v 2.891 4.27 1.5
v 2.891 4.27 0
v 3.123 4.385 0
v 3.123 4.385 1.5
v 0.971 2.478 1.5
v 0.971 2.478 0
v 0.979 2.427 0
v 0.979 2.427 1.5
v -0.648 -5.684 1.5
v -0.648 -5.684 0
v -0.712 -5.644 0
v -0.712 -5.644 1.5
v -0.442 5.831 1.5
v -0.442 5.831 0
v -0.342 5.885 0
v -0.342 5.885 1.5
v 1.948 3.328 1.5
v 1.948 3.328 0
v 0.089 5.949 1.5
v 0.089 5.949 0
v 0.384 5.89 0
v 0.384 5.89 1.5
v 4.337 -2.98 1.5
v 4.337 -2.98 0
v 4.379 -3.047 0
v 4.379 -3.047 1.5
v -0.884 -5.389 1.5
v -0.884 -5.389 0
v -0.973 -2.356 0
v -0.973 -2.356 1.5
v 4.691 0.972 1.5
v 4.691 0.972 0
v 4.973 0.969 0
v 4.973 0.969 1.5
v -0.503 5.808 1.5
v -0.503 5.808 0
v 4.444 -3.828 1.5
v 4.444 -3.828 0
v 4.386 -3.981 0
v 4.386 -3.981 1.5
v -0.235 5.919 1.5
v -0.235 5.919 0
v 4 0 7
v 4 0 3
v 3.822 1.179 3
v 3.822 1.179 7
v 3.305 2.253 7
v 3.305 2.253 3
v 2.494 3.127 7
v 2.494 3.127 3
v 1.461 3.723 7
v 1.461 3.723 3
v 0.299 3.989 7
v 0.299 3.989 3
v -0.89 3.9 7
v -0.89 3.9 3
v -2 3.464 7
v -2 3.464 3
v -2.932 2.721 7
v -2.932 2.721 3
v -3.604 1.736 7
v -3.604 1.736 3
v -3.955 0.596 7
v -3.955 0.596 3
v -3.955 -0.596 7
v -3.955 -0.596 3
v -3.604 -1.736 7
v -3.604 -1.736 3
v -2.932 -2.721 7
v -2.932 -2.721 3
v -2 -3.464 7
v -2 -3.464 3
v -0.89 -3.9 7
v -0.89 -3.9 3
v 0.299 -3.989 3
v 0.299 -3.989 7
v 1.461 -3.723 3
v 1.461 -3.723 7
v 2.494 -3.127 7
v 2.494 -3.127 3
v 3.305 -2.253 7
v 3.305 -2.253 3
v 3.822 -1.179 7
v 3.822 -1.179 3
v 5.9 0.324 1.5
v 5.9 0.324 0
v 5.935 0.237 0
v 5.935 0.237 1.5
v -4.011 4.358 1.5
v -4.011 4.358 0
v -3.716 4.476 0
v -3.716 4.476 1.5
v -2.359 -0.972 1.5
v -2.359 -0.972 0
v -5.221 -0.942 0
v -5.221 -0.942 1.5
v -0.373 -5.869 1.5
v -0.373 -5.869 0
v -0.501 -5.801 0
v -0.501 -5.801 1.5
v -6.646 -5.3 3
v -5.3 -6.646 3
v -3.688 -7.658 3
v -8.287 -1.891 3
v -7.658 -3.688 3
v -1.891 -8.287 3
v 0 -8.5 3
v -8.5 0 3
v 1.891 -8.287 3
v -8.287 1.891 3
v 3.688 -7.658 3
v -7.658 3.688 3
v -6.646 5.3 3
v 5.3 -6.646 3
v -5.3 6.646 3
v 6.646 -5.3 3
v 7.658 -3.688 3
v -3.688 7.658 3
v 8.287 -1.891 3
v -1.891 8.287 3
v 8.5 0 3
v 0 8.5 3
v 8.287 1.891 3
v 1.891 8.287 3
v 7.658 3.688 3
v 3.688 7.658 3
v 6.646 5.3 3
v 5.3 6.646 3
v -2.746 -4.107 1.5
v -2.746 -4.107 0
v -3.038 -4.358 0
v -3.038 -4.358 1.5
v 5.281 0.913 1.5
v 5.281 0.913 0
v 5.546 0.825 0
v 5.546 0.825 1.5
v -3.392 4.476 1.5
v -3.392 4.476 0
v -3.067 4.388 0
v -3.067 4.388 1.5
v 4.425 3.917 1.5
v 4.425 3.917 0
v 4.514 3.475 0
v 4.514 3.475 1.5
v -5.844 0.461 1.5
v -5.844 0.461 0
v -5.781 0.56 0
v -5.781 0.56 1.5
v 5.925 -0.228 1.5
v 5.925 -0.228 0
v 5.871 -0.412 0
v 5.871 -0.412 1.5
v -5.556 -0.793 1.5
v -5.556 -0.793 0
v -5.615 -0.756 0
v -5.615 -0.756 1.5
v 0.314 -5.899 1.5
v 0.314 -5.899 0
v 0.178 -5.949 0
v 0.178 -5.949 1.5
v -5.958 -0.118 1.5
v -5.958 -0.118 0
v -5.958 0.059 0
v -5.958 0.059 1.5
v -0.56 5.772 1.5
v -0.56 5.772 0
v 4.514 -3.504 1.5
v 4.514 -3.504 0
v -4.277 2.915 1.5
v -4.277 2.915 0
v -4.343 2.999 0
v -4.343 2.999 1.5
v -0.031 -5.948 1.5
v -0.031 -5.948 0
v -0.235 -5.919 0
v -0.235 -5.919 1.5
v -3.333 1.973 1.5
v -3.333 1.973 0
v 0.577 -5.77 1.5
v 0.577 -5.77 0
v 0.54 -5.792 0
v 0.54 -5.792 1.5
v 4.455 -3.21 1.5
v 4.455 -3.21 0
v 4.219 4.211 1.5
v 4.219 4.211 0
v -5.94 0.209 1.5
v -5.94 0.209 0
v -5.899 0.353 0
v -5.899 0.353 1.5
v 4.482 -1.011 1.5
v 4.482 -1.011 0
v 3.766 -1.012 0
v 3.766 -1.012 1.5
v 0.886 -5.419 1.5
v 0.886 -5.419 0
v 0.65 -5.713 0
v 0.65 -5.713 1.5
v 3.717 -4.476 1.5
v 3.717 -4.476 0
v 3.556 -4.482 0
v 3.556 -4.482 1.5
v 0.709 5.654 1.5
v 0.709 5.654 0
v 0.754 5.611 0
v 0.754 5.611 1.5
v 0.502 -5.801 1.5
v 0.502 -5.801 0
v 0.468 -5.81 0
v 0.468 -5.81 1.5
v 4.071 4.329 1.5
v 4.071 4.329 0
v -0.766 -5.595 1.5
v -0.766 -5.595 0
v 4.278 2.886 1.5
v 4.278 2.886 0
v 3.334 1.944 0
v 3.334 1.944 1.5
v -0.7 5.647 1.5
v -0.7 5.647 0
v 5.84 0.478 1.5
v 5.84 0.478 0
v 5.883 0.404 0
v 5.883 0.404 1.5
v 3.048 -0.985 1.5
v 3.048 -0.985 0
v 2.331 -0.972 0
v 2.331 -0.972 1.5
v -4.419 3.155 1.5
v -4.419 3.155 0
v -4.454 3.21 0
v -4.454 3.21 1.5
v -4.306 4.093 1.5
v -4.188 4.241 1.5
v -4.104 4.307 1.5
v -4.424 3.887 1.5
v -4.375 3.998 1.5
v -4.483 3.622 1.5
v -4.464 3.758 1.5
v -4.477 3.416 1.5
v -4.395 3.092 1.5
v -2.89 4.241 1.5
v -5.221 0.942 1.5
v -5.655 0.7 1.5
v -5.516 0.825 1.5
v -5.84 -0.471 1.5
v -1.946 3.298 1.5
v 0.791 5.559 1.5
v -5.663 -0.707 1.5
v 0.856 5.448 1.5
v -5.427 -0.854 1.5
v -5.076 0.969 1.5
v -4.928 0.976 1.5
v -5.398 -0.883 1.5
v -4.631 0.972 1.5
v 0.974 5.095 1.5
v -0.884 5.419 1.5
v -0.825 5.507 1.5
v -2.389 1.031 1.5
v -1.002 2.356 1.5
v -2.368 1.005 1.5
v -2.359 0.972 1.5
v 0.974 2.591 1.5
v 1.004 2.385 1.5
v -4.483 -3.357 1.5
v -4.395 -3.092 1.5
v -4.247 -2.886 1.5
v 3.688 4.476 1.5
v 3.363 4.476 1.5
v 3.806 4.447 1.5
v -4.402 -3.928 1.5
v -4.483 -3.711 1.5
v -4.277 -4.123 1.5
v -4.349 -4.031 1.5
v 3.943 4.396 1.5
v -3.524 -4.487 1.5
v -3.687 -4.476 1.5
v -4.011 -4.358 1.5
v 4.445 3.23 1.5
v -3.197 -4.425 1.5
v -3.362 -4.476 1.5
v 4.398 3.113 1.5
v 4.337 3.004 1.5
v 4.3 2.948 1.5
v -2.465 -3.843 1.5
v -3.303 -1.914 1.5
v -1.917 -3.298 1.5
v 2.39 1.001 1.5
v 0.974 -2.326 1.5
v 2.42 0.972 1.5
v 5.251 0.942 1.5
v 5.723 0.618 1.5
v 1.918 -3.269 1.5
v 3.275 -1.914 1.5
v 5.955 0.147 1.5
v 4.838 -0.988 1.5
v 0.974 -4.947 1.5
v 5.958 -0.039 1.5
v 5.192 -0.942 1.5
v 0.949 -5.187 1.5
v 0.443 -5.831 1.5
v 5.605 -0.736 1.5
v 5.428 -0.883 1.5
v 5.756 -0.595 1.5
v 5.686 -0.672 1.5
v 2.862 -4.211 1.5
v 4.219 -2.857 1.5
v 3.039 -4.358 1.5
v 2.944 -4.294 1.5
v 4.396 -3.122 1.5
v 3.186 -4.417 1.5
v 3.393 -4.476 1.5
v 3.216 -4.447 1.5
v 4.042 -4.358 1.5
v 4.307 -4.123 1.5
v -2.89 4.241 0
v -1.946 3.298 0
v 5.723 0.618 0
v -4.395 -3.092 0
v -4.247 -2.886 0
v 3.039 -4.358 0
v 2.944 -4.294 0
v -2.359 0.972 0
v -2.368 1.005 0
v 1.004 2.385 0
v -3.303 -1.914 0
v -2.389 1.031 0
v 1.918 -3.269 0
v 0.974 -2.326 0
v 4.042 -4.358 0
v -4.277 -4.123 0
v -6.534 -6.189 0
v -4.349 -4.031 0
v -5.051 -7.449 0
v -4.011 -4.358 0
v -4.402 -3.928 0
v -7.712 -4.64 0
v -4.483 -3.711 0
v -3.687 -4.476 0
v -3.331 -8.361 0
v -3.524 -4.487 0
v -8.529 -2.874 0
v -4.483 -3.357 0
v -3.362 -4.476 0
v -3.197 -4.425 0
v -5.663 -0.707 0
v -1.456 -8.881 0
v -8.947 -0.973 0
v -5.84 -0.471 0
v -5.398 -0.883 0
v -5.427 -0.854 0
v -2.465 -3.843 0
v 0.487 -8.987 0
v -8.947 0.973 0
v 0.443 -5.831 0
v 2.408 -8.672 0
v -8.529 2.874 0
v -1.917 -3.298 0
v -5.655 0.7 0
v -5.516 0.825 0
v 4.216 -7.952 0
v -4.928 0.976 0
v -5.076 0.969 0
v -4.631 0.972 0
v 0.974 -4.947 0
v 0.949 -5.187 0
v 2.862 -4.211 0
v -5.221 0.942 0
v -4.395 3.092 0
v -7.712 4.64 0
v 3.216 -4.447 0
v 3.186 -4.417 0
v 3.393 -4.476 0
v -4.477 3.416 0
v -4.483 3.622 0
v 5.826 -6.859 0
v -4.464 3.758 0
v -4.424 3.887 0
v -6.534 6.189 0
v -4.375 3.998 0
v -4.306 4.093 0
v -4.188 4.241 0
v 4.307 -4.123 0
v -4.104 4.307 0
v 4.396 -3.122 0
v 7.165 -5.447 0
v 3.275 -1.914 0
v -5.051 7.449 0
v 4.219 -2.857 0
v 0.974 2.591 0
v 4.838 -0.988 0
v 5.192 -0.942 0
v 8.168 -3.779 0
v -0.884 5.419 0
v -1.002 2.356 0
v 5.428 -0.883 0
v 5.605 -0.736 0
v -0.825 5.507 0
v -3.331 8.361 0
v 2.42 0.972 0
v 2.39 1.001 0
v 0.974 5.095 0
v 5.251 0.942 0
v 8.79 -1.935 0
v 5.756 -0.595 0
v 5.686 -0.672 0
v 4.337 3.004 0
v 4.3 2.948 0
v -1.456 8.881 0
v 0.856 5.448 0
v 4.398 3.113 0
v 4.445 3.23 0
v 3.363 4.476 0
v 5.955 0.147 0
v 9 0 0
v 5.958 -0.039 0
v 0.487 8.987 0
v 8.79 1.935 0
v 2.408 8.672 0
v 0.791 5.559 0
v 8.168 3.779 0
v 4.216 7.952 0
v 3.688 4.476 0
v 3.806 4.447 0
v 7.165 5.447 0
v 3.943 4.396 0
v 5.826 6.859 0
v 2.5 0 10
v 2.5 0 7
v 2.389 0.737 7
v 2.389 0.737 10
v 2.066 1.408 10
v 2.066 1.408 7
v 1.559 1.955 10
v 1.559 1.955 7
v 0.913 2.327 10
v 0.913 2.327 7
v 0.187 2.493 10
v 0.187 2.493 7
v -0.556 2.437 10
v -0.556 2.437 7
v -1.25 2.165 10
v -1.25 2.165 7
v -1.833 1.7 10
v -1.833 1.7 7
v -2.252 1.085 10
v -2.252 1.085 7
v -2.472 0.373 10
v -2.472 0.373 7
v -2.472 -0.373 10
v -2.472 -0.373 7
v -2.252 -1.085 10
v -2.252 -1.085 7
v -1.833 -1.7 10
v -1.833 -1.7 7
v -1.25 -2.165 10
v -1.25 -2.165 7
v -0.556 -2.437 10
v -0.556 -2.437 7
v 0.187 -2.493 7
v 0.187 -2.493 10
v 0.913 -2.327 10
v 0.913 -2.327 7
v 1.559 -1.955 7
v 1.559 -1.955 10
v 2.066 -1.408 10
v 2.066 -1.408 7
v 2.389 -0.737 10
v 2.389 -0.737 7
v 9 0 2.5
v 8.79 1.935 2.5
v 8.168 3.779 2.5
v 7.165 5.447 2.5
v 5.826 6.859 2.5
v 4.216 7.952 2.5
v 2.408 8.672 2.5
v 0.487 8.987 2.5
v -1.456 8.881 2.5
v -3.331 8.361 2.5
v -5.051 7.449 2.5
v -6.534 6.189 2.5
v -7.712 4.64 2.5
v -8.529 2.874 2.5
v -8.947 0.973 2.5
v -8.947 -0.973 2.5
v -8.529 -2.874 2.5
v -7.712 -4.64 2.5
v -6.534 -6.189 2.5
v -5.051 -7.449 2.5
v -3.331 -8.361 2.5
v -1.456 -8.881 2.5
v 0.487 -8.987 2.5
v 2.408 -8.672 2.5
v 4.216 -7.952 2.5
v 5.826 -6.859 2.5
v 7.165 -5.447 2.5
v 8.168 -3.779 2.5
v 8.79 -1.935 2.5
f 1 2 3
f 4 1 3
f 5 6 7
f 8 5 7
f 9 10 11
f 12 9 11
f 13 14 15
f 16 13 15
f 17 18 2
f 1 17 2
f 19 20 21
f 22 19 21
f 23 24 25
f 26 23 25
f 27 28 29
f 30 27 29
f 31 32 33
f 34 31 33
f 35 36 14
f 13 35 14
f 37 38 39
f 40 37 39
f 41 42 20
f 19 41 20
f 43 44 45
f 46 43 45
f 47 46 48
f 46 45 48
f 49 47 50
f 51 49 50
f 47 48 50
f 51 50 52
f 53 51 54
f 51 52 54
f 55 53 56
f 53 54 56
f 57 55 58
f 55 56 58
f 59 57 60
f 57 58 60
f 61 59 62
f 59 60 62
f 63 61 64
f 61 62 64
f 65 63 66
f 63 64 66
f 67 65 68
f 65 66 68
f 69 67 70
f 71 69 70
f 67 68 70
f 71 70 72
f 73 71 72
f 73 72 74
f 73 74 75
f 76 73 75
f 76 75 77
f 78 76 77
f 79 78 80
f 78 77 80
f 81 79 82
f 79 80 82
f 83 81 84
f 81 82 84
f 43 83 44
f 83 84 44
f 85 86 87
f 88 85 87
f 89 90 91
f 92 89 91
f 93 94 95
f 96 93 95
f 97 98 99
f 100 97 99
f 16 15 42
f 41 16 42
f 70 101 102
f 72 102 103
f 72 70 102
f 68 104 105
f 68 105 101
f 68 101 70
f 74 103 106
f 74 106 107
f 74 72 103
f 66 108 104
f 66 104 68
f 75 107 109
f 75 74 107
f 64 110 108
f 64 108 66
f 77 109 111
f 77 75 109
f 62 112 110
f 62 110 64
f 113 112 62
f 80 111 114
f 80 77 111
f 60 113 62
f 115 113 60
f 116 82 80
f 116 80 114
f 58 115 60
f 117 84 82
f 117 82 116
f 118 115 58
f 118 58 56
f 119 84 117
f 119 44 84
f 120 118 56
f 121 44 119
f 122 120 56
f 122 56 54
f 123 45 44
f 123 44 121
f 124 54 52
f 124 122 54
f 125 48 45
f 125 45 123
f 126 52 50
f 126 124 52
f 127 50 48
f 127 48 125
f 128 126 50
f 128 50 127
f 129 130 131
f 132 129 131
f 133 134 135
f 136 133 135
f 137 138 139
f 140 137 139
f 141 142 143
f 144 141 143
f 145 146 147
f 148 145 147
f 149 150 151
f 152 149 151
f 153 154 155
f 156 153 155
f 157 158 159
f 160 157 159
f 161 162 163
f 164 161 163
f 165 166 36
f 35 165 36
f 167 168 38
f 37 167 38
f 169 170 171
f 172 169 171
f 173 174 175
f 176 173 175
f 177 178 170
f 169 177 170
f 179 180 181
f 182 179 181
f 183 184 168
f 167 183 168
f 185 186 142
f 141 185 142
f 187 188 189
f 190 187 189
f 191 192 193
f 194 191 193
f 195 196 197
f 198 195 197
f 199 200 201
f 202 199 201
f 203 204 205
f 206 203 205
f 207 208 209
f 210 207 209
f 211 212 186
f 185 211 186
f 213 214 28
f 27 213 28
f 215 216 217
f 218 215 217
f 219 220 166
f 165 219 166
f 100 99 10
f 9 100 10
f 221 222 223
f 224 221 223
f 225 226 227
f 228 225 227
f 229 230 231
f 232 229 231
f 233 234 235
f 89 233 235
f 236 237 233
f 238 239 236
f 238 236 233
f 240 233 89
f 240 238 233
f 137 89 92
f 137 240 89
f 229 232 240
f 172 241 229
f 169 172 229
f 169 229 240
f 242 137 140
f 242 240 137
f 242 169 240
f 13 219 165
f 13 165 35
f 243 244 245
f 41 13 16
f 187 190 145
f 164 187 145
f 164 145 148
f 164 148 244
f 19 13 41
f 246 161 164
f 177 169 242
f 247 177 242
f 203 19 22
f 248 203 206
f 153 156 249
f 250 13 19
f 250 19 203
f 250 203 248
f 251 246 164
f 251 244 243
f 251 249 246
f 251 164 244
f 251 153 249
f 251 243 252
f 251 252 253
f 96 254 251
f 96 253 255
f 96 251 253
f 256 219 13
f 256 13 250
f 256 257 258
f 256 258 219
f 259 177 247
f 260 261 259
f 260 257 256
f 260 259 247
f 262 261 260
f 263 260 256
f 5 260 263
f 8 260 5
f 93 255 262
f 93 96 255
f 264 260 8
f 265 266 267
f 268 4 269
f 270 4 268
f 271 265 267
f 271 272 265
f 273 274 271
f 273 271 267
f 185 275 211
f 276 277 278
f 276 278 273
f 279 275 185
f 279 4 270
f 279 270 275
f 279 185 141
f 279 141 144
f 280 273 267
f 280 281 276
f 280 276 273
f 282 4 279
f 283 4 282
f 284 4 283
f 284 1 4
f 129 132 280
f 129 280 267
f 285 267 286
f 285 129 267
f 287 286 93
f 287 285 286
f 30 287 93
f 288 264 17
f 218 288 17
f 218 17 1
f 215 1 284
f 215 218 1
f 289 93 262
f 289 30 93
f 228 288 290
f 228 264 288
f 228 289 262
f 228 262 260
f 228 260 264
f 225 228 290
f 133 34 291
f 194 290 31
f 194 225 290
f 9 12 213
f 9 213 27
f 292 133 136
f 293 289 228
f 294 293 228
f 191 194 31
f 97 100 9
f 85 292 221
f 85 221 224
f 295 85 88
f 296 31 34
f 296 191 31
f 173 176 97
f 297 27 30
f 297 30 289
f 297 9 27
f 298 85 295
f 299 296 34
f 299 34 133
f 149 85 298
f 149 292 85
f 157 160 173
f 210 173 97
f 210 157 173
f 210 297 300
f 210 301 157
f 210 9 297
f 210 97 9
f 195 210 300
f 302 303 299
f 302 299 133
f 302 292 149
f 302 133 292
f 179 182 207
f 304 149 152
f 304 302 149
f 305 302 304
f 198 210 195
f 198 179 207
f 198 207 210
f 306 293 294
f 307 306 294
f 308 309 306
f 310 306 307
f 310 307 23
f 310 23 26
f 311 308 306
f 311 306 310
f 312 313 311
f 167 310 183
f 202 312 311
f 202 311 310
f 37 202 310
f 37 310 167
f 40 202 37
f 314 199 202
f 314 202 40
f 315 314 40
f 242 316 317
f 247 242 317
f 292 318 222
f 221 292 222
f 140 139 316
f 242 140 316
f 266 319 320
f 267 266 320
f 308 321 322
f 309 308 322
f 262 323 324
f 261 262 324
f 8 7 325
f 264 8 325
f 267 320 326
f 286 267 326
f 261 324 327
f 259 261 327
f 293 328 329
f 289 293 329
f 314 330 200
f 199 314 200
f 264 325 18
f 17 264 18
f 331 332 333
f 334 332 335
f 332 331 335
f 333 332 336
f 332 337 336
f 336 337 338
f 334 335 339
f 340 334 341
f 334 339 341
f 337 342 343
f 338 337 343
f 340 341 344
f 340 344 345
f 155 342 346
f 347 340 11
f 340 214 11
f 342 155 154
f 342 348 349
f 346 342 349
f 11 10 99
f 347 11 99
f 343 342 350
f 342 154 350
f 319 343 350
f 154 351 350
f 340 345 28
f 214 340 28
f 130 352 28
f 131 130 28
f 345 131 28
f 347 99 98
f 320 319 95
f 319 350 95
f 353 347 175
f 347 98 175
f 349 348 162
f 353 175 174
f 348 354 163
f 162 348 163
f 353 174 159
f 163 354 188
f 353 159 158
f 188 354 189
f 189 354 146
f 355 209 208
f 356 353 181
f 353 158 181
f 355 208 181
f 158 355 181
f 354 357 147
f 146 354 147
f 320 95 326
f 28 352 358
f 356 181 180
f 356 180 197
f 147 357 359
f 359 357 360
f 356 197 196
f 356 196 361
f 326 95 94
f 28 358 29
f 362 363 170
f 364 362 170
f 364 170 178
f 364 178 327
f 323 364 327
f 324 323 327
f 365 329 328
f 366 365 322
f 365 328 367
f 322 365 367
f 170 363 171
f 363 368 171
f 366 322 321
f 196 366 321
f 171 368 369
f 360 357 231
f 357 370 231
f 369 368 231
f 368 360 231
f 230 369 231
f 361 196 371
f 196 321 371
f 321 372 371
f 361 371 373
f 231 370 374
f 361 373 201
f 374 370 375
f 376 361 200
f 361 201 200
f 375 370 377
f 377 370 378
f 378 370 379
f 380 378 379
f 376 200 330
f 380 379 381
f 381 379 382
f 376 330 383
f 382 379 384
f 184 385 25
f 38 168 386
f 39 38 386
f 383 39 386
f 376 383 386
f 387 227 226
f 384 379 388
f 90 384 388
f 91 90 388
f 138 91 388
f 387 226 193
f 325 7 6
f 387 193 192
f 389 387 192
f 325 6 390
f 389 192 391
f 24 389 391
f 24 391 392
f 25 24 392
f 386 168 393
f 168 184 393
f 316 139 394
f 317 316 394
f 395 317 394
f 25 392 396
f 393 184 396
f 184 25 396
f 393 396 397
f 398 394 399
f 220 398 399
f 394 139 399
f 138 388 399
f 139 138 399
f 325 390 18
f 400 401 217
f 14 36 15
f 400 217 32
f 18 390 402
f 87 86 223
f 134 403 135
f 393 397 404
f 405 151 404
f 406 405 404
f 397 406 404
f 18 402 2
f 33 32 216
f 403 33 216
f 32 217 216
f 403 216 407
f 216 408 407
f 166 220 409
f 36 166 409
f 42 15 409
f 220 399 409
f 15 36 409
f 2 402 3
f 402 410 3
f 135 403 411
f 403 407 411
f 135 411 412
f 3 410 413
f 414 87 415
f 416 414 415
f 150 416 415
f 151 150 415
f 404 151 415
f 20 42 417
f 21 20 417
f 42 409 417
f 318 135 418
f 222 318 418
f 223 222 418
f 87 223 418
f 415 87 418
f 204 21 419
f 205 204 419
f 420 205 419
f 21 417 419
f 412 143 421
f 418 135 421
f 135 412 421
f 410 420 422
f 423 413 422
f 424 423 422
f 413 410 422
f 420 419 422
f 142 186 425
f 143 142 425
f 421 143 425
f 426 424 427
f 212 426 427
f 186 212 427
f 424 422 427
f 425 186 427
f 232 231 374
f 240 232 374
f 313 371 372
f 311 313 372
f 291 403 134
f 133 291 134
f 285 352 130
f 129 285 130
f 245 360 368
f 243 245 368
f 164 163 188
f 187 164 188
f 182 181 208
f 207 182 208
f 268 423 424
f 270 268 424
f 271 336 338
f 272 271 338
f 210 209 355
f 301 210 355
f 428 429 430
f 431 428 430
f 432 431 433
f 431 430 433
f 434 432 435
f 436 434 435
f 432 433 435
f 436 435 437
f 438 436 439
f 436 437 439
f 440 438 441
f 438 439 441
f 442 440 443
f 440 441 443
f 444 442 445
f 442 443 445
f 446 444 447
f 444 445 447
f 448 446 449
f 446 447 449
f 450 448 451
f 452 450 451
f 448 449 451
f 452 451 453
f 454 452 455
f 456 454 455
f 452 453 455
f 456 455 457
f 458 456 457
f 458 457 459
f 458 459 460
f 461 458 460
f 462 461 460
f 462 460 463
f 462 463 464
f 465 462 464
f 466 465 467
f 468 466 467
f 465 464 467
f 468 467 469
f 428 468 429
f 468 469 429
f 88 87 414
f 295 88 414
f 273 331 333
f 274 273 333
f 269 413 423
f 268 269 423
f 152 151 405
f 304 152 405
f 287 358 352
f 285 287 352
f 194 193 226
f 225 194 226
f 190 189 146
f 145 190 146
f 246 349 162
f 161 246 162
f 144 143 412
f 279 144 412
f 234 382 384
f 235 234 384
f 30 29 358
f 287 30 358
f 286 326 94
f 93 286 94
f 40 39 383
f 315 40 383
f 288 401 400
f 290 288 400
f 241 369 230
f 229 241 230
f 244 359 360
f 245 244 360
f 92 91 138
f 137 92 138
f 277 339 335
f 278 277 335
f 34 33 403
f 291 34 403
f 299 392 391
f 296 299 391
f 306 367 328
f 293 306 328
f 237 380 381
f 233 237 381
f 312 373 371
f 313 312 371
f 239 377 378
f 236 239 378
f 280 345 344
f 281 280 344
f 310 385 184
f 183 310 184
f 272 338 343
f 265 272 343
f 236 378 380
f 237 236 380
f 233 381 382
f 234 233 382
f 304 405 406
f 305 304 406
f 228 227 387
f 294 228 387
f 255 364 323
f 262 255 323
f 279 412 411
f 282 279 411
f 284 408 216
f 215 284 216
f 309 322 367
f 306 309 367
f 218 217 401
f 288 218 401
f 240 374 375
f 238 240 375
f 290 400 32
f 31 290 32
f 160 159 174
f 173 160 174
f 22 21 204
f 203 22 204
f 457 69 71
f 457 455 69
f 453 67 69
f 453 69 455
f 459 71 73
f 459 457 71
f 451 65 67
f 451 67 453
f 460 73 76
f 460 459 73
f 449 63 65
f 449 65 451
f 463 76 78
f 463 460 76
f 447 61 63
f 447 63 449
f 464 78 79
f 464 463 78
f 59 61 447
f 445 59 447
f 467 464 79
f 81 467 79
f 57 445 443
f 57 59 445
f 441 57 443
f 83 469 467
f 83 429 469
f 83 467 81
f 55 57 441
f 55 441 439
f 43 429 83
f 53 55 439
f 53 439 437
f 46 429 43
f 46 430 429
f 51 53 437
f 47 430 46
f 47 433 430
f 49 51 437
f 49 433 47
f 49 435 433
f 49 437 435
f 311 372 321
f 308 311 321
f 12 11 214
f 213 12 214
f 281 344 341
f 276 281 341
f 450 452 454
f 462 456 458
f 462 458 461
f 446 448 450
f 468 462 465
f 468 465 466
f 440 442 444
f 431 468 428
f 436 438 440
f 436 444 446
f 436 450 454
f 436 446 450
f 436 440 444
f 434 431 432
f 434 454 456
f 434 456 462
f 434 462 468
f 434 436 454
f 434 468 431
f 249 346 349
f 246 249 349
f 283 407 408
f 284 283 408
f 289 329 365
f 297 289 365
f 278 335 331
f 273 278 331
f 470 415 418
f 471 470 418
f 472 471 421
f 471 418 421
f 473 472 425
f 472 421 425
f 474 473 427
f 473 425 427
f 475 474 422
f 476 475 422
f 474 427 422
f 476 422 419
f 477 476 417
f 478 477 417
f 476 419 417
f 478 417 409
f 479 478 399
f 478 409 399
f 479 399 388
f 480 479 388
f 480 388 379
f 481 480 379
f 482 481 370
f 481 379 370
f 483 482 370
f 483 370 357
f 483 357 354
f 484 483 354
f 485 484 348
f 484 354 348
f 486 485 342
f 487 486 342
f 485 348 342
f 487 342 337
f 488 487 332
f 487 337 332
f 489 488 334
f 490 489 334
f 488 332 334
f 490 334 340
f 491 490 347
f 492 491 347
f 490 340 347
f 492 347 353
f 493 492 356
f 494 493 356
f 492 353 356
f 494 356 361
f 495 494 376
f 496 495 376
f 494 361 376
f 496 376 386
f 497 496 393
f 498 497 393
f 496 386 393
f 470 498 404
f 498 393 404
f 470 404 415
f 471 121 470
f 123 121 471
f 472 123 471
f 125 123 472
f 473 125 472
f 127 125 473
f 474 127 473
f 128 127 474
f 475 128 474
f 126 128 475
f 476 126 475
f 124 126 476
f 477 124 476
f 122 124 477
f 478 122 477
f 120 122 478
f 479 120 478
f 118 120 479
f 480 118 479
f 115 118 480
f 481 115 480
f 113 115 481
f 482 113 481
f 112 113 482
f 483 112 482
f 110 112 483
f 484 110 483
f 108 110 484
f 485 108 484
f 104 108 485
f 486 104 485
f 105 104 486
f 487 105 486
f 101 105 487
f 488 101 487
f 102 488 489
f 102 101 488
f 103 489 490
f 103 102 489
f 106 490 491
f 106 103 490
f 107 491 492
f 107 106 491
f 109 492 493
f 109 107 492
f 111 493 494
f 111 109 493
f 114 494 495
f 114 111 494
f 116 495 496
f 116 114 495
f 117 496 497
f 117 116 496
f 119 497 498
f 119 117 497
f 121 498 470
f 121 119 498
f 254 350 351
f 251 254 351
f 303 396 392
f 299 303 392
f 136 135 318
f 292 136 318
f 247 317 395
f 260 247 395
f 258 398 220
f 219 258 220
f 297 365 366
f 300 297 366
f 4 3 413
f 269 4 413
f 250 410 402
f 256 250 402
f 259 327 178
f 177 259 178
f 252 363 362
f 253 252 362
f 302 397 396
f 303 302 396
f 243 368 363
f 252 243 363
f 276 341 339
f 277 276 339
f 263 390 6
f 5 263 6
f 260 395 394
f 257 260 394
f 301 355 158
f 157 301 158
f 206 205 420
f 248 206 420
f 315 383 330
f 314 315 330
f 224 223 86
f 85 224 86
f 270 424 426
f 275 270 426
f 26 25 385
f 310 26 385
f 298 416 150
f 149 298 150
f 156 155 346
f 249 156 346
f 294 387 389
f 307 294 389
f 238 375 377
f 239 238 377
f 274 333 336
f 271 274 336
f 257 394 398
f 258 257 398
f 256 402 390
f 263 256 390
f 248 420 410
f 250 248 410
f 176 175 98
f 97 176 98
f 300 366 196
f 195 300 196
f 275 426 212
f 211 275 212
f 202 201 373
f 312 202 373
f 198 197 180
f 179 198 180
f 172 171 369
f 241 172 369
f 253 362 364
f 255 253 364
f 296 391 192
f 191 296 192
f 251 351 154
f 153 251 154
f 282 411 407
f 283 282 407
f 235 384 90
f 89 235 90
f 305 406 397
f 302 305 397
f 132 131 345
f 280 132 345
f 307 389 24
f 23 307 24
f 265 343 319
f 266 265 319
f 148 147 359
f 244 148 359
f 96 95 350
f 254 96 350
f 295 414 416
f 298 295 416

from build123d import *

# Parameters (mm, degrees)
F0_R     = 9
F1_DEPTH = 3
F2_SIZE  = 0.5
F3_R     = 4
F4_DEPTH = 4
F5_R     = 2.5
F6_DEPTH = 3
F8_DEPTH = 1.5


with BuildPart() as f1:
    # F0 (on Top) → F1 (new body)
    with BuildSketch(Plane.XY):
        Circle(F0_R)
    extrude(amount=F1_DEPTH)

    # F2
    f2_edges = [f1.edges().sort_by_distance(p)[0] for p in [
        (-9, 0, 3),
    ]]
    chamfer(f2_edges, length=F2_SIZE)

    # F3 (on face) → F4 (join)
    with BuildSketch(Plane.XY.offset(3)):
        Circle(F3_R)
    extrude(amount=F4_DEPTH)

    # F5 (on face) → F6 (join)
    with BuildSketch(Plane.XY.offset(7)):
        Circle(F5_R)
    extrude(amount=F6_DEPTH)

    # F7 (on face) → F8 (cut)
    with BuildSketch(Plane(origin=(0, 0, 0), x_dir=(1, 0, 0), z_dir=(0, 0, -1))):
        Polygon((-0.031379, 5.948377), (-0.235333, 5.919157), (-0.372759, 5.868757), (-0.500818, 5.801363), (-0.64831, 5.683569), (-0.711513, 5.643549), (-0.766303, 5.595223), (-0.884297, 5.389084), (-0.972792, 2.355883), (-1.91674, 3.298237), (-2.464657, 3.842872), (-2.74588, 4.106761), (-3.037677, 4.358384), (-3.197437, 4.424921), (-3.362159, 4.476179), (-3.5244, 4.487041), (-3.686641, 4.476179), (-4.011123, 4.358384), (-4.276609, 4.122796), (-4.349034, 4.030994), (-4.401972, 3.928468), (-4.483097, 3.710516), (-4.483097, 3.357134), (-4.394602, 3.092097), (-4.24711, 2.885957), (-3.303163, 1.914155), (-2.359215, 0.971802), (-5.220556, 0.942353), (-5.397547, 0.883456), (-5.427045, 0.854008), (-5.556038, 0.793243), (-5.614945, 0.756011), (-5.663032, 0.706765), (-5.840022, 0.471176), (-5.958016, 0.117794), (-5.958016, -0.058897), (-5.940408, -0.209293), (-5.899019, -0.353383), (-5.843566, -0.461413), (-5.781025, -0.559523), (-5.655249, -0.699811), (-5.51554, -0.82456), (-5.220556, -0.942354), (-5.075648, -0.968558), (-4.928112, -0.97628), (-4.630589, -0.971802), (-4.188114, -0.971802), (-2.359215, -0.971802), (-2.368134, -1.005446), (-2.388713, -1.030699), (-3.332661, -1.973053), (-4.276609, -2.915406), (-4.34313, -2.999393), (-4.394602, -3.092097), (-4.419005, -3.155066), (-4.453599, -3.209892), (-4.476923, -3.415726), (-4.483097, -3.622171), (-4.464349, -3.757662), (-4.424101, -3.887208), (-4.374765, -3.997645), (-4.306107, -4.093348), (-4.188114, -4.240591), (-4.103985, -4.307), (-4.011123, -4.358385), (-3.71614, -4.476179), (-3.391658, -4.476179), (-3.067176, -4.387833), (-2.890186, -4.240591), (-1.946238, -3.298237), (-1.00229, -2.355884), (-0.884297, -5.418533), (-0.8253, -5.506878), (-0.699524, -5.647167), (-0.559815, -5.771915), (-0.503448, -5.807594), (-0.441821, -5.830812), (-0.341941, -5.885287), (-0.235333, -5.919158), (0.089149, -5.948606), (0.384133, -5.889709), (0.708615, -5.654121), (0.754319, -5.61094), (0.790702, -5.558969), (0.856107, -5.447981), (0.9741, -5.094599), (0.9741, -4.417282), (0.9741, -2.591472), (0.971489, -2.477691), (0.979459, -2.426523), (1.003599, -2.385332), (1.947546, -3.327686), (2.891494, -4.270039), (3.122896, -4.385014), (3.363468, -4.476179), (3.68795, -4.476179), (3.805943, -4.446731), (3.94337, -4.39633), (4.071429, -4.328936), (4.218921, -4.211142), (4.425409, -3.916657), (4.513904, -3.474929), (4.444862, -3.229831), (4.398065, -3.113042), (4.336914, -3.003752), (4.300041, -2.947904), (4.277917, -2.885958), (3.33397, -1.943604), (2.390022, -1.001251), (2.41952, -0.971802), (2.861996, -0.971802), (4.690894, -0.971802), (4.972609, -0.968567), (5.251363, -0.942354), (5.280862, -0.912905), (5.546347, -0.82456), (5.723337, -0.61842), (5.839817, -0.478169), (5.883167, -0.404005), (5.900327, -0.323934), (5.934856, -0.237188), (5.954737, -0.147151), (5.958016, 0.039233), (5.925076, 0.228087), (5.870829, 0.412279), (5.7562, 0.594983), (5.685681, 0.672036), (5.605344, 0.736213), (5.428354, 0.883456), (5.192367, 0.942353), (4.838344, 0.987761), (4.482387, 1.011028), (3.766457, 1.011578), (3.048146, 0.984877), (2.331025, 0.971802), (3.274973, 1.914155), (4.218921, 2.856509), (4.337268, 2.979647), (4.379451, 3.047229), (4.395911, 3.121546), (4.454907, 3.209891), (4.513904, 3.504377), (4.444233, 3.827854), (4.386266, 3.98061), (4.307416, 4.122796), (4.04193, 4.358384), (3.717448, 4.476179), (3.555567, 4.481563), (3.392966, 4.476179), (3.215976, 4.44673), (3.186478, 4.417282), (3.038986, 4.358384), (2.944209, 4.294123), (2.861996, 4.211142), (1.918048, 3.268788), (0.9741, 2.326435), (0.9741, 3.092097), (0.9741, 4.947355), (0.94889, 5.186814), (0.885605, 5.418532), (0.649618, 5.713018), (0.576669, 5.769819), (0.540299, 5.792295), (0.502126, 5.801363), (0.468426, 5.810267), (0.44313, 5.830812), (0.313926, 5.898818), (0.177644, 5.948606), align=None)
    extrude(amount=-F8_DEPTH, mode=Mode.SUBTRACT)


solid = f1.part
